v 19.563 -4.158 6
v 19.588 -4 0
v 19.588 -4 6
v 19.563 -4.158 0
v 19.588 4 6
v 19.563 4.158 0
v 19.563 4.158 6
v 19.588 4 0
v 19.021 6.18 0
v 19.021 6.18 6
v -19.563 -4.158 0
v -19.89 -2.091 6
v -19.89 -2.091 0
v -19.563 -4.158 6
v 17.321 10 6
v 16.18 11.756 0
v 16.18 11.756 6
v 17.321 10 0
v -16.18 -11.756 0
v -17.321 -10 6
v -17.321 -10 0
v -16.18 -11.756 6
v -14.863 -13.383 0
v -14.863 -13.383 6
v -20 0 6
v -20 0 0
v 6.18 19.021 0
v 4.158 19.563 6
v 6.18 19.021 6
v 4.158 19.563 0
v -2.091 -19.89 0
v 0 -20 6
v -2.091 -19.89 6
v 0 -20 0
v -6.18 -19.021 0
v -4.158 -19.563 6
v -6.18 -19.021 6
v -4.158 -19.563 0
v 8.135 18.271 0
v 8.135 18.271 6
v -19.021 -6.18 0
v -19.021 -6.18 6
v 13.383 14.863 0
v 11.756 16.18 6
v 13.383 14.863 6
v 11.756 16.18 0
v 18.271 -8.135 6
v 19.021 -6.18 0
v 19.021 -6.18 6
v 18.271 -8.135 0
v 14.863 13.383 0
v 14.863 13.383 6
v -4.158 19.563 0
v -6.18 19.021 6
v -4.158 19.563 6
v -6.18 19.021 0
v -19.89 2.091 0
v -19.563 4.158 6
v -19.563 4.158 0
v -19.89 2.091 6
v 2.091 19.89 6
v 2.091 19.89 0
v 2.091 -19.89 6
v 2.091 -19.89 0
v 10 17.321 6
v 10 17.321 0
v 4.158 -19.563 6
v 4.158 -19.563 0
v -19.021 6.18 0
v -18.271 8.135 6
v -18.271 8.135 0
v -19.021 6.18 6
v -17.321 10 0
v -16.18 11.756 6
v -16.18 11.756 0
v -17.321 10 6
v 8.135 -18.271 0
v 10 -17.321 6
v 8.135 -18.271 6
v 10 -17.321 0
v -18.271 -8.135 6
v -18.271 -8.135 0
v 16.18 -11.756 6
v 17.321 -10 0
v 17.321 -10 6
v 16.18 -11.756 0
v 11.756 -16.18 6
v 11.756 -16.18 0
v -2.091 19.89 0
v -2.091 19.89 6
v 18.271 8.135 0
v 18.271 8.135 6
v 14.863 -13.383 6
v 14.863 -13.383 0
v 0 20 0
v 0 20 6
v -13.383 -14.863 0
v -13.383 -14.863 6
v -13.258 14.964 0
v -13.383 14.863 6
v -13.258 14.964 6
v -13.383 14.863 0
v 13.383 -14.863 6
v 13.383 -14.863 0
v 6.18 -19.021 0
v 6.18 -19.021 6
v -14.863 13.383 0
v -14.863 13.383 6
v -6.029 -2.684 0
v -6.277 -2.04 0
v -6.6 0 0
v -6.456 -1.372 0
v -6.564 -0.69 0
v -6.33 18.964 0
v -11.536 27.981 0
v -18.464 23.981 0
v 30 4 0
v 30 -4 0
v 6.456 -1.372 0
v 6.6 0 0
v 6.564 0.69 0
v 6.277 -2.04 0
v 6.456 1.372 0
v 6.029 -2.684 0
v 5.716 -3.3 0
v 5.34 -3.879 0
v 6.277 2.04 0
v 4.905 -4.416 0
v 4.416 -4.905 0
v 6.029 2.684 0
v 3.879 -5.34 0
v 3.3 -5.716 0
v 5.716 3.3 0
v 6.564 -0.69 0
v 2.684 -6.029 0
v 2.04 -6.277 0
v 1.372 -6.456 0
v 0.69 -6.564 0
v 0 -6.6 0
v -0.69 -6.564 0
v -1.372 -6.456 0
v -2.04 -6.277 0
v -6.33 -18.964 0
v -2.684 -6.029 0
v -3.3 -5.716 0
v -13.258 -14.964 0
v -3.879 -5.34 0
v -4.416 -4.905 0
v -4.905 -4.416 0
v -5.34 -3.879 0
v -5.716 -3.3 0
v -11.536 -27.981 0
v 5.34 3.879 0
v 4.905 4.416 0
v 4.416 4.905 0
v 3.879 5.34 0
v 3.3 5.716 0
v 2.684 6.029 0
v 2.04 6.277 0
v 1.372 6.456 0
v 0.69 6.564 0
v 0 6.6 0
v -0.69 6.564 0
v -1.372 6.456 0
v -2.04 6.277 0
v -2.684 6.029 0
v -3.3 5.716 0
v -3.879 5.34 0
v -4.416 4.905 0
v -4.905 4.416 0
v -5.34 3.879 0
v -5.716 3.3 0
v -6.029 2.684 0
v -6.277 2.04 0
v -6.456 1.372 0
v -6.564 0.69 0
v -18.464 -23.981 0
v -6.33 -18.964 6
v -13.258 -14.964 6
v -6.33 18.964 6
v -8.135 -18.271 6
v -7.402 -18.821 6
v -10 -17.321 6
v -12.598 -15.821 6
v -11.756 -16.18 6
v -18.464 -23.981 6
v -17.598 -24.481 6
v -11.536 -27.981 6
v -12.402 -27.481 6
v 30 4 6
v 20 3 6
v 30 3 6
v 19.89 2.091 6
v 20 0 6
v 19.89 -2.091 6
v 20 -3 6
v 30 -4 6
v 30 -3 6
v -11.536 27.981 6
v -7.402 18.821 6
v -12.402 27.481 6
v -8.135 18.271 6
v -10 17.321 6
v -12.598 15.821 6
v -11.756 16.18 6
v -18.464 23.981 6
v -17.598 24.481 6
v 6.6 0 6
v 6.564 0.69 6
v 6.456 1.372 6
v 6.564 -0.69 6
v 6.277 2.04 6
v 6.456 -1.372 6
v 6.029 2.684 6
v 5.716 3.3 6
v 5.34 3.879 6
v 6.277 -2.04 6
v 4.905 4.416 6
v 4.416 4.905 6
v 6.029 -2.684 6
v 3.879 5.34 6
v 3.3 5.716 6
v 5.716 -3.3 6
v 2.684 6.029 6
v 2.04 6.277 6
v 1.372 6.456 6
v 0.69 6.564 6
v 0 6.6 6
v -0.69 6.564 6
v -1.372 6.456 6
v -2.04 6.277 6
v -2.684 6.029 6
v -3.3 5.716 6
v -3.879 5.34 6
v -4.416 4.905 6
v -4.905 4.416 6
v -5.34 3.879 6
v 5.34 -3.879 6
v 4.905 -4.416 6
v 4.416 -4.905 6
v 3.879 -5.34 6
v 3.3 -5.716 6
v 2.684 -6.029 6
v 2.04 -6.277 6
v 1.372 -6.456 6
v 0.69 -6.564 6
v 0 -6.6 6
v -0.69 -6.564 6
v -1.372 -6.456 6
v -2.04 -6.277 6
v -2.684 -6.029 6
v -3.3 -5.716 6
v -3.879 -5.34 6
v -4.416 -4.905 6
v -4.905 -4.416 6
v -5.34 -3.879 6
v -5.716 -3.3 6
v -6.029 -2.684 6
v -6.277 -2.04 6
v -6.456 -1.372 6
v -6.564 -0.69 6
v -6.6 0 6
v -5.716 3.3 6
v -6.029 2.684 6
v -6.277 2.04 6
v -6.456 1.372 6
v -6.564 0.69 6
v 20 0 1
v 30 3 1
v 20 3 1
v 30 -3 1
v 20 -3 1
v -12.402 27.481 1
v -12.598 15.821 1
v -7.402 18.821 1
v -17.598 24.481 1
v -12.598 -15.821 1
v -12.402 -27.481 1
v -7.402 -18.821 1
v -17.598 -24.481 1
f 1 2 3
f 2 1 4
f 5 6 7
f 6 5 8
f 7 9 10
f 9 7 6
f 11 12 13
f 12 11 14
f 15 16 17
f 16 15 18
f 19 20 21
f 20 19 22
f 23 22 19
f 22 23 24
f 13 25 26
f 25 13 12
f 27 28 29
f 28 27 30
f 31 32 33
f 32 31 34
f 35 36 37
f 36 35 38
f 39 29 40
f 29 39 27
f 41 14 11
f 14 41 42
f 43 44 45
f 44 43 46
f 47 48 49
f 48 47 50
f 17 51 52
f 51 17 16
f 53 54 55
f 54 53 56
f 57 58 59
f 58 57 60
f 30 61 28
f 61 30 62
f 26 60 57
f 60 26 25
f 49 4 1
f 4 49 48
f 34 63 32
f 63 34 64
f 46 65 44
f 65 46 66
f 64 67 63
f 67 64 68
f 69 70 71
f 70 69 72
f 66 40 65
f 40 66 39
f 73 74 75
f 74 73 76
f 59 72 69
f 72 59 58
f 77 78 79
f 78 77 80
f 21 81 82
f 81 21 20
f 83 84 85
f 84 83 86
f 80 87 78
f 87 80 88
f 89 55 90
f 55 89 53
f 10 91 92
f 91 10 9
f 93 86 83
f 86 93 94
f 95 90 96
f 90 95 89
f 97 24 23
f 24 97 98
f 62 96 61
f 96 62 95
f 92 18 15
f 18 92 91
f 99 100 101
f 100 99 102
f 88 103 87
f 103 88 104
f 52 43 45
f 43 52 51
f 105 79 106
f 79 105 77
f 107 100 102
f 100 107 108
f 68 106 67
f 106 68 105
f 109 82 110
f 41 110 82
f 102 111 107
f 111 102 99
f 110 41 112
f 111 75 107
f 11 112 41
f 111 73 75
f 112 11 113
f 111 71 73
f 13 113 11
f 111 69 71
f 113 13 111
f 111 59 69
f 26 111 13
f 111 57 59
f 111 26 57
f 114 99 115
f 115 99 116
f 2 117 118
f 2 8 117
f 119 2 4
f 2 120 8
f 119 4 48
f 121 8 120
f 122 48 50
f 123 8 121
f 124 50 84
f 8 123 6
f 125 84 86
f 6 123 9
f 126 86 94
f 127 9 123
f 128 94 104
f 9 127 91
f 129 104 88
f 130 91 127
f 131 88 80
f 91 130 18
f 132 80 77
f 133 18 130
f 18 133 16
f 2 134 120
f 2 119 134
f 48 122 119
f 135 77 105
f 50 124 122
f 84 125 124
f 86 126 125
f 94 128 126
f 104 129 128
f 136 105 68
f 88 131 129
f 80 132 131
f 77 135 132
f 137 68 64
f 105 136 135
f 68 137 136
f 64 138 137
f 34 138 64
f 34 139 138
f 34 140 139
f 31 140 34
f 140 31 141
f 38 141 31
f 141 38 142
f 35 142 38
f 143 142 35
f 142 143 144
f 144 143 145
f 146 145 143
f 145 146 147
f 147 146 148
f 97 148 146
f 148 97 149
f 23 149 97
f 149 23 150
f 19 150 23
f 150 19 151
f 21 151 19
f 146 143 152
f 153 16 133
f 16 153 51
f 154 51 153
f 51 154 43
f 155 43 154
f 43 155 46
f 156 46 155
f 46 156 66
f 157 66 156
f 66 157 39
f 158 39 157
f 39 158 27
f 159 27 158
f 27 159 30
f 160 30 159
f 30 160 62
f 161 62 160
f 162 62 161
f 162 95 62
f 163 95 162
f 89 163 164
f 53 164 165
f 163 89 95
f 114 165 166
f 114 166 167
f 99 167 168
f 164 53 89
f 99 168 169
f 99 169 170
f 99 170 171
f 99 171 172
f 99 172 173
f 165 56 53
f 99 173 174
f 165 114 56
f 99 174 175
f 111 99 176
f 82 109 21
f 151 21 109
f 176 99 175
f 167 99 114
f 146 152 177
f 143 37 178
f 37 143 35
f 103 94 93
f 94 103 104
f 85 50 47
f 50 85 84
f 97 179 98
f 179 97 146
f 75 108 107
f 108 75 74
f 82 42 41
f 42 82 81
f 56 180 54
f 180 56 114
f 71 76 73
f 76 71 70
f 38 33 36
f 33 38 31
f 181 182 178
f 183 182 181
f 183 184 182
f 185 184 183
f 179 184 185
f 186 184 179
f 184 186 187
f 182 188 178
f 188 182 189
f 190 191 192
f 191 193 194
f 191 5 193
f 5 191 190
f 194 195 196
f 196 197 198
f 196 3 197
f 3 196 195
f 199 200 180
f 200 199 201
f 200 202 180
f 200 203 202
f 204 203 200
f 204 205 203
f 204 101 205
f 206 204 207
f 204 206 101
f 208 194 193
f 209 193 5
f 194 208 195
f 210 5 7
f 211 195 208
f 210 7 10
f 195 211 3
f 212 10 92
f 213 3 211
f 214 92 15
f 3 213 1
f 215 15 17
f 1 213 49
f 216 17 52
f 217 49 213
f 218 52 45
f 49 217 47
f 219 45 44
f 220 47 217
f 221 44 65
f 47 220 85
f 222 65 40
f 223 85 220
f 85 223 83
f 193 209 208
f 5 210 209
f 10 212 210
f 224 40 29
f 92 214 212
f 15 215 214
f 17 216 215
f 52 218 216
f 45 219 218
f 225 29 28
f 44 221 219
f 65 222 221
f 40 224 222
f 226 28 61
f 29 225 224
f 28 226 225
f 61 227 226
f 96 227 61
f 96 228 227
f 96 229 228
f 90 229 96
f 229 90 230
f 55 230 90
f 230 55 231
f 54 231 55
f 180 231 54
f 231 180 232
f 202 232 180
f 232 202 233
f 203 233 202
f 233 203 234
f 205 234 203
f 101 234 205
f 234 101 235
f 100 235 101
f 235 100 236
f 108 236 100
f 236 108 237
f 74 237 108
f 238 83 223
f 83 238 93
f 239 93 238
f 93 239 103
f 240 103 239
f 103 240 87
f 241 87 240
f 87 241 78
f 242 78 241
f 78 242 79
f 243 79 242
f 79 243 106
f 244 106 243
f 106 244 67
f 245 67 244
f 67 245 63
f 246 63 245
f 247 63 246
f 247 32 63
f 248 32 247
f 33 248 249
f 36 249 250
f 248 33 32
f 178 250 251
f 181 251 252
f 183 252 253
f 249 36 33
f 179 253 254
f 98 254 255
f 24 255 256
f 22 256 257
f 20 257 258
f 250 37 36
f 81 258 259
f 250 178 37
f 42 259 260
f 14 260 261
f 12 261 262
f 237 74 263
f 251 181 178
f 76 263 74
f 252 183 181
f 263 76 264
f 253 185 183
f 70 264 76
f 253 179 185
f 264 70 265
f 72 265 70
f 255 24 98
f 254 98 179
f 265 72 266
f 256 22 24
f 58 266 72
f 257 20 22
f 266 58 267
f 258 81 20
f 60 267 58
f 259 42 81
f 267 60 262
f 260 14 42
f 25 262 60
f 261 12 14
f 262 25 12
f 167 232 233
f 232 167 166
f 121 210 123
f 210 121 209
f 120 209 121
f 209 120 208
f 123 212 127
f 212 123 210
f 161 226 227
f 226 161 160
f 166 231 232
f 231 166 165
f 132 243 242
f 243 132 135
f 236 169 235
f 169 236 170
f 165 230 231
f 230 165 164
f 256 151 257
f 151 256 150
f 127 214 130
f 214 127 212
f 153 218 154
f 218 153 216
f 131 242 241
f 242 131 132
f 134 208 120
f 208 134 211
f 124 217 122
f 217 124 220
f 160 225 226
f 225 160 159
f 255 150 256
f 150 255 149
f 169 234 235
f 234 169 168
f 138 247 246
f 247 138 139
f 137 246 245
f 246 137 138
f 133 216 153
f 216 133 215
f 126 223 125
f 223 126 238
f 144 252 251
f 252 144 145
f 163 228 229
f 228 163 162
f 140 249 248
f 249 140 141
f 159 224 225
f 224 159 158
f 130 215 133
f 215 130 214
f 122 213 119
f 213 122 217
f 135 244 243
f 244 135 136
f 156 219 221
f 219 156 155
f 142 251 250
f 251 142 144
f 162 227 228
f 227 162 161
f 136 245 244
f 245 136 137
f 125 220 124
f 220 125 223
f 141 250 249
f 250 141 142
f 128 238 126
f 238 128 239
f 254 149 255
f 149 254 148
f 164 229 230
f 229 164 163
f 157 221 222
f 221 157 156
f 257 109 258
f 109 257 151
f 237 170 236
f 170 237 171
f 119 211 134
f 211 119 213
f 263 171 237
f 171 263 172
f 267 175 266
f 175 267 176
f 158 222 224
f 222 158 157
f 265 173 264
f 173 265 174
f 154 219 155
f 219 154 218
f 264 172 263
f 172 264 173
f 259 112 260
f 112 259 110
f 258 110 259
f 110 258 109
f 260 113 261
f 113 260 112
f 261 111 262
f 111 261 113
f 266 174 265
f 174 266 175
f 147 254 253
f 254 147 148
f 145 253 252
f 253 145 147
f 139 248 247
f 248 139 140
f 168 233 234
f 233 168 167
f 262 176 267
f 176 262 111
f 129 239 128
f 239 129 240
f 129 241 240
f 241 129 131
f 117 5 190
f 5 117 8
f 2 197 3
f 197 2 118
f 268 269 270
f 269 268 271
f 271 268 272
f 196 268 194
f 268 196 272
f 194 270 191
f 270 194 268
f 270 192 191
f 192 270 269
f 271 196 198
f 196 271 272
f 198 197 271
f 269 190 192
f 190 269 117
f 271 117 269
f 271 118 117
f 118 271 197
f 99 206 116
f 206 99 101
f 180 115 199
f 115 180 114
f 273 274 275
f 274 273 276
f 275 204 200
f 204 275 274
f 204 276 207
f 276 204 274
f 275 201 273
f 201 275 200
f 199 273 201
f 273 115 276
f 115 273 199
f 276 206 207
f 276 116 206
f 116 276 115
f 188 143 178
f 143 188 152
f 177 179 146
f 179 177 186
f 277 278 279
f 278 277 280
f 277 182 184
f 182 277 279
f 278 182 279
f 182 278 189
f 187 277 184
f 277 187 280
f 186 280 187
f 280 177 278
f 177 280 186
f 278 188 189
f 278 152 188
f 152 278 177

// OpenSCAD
shaft_diameter = 12;



shaft_insert_height = 4;
cruz_base_height = 10;
wall_width = 2;
arm_height = cruz_base_height - shaft_insert_height;
cube_total_size = arm_height + wall_width;

support_ring_height = arm_height;
support_ring_radius = 20;

module ring()
{
    difference() {
        {cylinder(support_ring_height, r=support_ring_radius, $fn=60);}
        {cylinder(support_ring_height*1.2, d=shaft_diameter*1.1, $fn=60);}
     }
}

module hollow_cube(){
    difference(){
        {cube([cube_total_size*2, cube_total_size, cube_total_size], center=true);}
        {cube([arm_height*2, arm_height, arm_height], center=true);}
        }
    }

module fix(){
    difference() {
        difference(){
            {hollow_cube();}
            translate([0, 0, arm_height]) {cube(([cube_total_size*2, cube_total_size, cube_total_size]), center=true);}
            }
        translate([arm_height*2, 0, 0]) {cube(([cube_total_size*2, cube_total_size, cube_total_size]), center=true);}
    }
 }
 
module support_ring(){
    union(){
        {ring();}
        rotate([0, 0, 0]) {translate([arm_height + support_ring_radius, 0, cube_total_size/2]) {fix();}}
        rotate([0, 0, 120]) {translate([arm_height + support_ring_radius, 0, cube_total_size/2]) {fix();}}
        rotate([0, 0, 2400]) {translate([arm_height + support_ring_radius, 0, cube_total_size/2]) {fix();}}
        }
    }

support_ring();
